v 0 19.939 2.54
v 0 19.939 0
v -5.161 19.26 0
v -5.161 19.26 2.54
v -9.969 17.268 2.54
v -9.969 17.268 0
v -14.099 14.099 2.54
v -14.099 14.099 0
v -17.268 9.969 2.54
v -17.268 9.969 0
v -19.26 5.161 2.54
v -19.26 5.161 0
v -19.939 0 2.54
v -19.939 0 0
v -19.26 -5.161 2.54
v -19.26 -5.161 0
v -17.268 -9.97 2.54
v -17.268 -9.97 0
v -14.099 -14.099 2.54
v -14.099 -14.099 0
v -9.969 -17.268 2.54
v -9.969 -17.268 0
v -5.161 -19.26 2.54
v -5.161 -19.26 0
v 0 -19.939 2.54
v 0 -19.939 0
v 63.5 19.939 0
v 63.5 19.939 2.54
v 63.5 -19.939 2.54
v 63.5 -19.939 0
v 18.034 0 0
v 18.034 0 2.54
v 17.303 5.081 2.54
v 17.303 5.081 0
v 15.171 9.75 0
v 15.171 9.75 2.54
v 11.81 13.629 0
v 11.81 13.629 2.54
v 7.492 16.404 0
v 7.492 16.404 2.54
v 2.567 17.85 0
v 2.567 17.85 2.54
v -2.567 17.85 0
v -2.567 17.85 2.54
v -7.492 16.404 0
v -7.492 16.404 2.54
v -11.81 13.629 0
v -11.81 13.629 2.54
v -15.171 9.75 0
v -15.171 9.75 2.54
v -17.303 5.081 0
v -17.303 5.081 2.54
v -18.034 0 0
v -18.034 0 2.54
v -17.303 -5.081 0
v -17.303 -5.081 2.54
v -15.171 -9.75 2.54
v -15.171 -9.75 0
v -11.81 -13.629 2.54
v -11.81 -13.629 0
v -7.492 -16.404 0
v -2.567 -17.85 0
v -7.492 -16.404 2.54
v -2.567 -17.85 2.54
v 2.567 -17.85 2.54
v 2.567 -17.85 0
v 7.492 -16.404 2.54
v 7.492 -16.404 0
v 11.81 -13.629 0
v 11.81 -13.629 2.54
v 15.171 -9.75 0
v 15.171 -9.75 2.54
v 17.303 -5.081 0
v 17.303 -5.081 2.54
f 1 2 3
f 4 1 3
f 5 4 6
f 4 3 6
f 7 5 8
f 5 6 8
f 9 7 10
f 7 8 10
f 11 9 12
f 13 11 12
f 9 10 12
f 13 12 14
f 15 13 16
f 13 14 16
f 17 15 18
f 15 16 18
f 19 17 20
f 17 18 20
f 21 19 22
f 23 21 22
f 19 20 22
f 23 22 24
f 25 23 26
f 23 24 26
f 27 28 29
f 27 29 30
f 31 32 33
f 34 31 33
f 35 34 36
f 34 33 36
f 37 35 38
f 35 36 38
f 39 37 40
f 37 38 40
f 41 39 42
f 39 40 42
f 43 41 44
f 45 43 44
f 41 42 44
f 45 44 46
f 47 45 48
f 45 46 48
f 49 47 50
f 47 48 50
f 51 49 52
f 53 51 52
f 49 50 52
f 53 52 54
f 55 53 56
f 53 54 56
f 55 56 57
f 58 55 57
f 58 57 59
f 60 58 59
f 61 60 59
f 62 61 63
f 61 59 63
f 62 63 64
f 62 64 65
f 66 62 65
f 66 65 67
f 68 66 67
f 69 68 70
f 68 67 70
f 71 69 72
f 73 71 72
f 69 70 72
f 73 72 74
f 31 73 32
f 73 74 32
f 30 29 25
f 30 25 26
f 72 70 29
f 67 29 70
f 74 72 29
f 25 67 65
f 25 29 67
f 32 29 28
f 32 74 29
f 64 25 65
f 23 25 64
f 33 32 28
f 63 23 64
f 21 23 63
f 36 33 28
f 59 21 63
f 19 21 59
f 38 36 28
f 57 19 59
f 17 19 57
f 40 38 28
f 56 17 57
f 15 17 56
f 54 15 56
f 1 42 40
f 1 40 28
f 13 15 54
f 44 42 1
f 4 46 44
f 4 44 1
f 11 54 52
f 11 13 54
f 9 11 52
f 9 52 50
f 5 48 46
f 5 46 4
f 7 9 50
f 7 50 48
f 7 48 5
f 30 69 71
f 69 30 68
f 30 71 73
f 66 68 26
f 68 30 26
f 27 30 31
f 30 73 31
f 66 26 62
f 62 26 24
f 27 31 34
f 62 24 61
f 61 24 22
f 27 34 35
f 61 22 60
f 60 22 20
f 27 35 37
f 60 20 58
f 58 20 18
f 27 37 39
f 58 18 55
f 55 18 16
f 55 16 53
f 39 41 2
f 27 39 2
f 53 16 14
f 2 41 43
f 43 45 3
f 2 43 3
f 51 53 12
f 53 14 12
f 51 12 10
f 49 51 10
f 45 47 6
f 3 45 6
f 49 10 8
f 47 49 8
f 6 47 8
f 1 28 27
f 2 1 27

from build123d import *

# Parameters (mm, degrees)
SKETCH1_R           = 19.939
BOSS_EXTRUDE1_DEPTH = 2.54
SKETCH3_W           = 2.54
SKETCH3_H           = 39.878
BOSS_EXTRUDE2_DEPTH = 63.5
SKETCH2_R           = 18.034
CUT_EXTRUDE1_DEPTH  = 2.54


with BuildPart() as part:
    # Sketch1 → Boss-Extrude1 (new body)
    with BuildSketch(Plane.XY):
        Circle(SKETCH1_R)
    extrude(amount=BOSS_EXTRUDE1_DEPTH)

    # Sketch3 → Boss-Extrude2 (add)
    with BuildSketch(Plane(origin=(0, 0, 0), x_dir=(0, 0, -1), z_dir=(1, 0, 0))):
        with Locations((-1.27, 0)):
            Rectangle(SKETCH3_W, SKETCH3_H)
    extrude(amount=BOSS_EXTRUDE2_DEPTH)

    # Sketch2 → Cut-Extrude1 (cut)
    with BuildSketch(Plane.XY.offset(2.54)):
        Circle(SKETCH2_R)
    extrude(amount=-CUT_EXTRUDE1_DEPTH, mode=Mode.SUBTRACT)


solid = part.part
